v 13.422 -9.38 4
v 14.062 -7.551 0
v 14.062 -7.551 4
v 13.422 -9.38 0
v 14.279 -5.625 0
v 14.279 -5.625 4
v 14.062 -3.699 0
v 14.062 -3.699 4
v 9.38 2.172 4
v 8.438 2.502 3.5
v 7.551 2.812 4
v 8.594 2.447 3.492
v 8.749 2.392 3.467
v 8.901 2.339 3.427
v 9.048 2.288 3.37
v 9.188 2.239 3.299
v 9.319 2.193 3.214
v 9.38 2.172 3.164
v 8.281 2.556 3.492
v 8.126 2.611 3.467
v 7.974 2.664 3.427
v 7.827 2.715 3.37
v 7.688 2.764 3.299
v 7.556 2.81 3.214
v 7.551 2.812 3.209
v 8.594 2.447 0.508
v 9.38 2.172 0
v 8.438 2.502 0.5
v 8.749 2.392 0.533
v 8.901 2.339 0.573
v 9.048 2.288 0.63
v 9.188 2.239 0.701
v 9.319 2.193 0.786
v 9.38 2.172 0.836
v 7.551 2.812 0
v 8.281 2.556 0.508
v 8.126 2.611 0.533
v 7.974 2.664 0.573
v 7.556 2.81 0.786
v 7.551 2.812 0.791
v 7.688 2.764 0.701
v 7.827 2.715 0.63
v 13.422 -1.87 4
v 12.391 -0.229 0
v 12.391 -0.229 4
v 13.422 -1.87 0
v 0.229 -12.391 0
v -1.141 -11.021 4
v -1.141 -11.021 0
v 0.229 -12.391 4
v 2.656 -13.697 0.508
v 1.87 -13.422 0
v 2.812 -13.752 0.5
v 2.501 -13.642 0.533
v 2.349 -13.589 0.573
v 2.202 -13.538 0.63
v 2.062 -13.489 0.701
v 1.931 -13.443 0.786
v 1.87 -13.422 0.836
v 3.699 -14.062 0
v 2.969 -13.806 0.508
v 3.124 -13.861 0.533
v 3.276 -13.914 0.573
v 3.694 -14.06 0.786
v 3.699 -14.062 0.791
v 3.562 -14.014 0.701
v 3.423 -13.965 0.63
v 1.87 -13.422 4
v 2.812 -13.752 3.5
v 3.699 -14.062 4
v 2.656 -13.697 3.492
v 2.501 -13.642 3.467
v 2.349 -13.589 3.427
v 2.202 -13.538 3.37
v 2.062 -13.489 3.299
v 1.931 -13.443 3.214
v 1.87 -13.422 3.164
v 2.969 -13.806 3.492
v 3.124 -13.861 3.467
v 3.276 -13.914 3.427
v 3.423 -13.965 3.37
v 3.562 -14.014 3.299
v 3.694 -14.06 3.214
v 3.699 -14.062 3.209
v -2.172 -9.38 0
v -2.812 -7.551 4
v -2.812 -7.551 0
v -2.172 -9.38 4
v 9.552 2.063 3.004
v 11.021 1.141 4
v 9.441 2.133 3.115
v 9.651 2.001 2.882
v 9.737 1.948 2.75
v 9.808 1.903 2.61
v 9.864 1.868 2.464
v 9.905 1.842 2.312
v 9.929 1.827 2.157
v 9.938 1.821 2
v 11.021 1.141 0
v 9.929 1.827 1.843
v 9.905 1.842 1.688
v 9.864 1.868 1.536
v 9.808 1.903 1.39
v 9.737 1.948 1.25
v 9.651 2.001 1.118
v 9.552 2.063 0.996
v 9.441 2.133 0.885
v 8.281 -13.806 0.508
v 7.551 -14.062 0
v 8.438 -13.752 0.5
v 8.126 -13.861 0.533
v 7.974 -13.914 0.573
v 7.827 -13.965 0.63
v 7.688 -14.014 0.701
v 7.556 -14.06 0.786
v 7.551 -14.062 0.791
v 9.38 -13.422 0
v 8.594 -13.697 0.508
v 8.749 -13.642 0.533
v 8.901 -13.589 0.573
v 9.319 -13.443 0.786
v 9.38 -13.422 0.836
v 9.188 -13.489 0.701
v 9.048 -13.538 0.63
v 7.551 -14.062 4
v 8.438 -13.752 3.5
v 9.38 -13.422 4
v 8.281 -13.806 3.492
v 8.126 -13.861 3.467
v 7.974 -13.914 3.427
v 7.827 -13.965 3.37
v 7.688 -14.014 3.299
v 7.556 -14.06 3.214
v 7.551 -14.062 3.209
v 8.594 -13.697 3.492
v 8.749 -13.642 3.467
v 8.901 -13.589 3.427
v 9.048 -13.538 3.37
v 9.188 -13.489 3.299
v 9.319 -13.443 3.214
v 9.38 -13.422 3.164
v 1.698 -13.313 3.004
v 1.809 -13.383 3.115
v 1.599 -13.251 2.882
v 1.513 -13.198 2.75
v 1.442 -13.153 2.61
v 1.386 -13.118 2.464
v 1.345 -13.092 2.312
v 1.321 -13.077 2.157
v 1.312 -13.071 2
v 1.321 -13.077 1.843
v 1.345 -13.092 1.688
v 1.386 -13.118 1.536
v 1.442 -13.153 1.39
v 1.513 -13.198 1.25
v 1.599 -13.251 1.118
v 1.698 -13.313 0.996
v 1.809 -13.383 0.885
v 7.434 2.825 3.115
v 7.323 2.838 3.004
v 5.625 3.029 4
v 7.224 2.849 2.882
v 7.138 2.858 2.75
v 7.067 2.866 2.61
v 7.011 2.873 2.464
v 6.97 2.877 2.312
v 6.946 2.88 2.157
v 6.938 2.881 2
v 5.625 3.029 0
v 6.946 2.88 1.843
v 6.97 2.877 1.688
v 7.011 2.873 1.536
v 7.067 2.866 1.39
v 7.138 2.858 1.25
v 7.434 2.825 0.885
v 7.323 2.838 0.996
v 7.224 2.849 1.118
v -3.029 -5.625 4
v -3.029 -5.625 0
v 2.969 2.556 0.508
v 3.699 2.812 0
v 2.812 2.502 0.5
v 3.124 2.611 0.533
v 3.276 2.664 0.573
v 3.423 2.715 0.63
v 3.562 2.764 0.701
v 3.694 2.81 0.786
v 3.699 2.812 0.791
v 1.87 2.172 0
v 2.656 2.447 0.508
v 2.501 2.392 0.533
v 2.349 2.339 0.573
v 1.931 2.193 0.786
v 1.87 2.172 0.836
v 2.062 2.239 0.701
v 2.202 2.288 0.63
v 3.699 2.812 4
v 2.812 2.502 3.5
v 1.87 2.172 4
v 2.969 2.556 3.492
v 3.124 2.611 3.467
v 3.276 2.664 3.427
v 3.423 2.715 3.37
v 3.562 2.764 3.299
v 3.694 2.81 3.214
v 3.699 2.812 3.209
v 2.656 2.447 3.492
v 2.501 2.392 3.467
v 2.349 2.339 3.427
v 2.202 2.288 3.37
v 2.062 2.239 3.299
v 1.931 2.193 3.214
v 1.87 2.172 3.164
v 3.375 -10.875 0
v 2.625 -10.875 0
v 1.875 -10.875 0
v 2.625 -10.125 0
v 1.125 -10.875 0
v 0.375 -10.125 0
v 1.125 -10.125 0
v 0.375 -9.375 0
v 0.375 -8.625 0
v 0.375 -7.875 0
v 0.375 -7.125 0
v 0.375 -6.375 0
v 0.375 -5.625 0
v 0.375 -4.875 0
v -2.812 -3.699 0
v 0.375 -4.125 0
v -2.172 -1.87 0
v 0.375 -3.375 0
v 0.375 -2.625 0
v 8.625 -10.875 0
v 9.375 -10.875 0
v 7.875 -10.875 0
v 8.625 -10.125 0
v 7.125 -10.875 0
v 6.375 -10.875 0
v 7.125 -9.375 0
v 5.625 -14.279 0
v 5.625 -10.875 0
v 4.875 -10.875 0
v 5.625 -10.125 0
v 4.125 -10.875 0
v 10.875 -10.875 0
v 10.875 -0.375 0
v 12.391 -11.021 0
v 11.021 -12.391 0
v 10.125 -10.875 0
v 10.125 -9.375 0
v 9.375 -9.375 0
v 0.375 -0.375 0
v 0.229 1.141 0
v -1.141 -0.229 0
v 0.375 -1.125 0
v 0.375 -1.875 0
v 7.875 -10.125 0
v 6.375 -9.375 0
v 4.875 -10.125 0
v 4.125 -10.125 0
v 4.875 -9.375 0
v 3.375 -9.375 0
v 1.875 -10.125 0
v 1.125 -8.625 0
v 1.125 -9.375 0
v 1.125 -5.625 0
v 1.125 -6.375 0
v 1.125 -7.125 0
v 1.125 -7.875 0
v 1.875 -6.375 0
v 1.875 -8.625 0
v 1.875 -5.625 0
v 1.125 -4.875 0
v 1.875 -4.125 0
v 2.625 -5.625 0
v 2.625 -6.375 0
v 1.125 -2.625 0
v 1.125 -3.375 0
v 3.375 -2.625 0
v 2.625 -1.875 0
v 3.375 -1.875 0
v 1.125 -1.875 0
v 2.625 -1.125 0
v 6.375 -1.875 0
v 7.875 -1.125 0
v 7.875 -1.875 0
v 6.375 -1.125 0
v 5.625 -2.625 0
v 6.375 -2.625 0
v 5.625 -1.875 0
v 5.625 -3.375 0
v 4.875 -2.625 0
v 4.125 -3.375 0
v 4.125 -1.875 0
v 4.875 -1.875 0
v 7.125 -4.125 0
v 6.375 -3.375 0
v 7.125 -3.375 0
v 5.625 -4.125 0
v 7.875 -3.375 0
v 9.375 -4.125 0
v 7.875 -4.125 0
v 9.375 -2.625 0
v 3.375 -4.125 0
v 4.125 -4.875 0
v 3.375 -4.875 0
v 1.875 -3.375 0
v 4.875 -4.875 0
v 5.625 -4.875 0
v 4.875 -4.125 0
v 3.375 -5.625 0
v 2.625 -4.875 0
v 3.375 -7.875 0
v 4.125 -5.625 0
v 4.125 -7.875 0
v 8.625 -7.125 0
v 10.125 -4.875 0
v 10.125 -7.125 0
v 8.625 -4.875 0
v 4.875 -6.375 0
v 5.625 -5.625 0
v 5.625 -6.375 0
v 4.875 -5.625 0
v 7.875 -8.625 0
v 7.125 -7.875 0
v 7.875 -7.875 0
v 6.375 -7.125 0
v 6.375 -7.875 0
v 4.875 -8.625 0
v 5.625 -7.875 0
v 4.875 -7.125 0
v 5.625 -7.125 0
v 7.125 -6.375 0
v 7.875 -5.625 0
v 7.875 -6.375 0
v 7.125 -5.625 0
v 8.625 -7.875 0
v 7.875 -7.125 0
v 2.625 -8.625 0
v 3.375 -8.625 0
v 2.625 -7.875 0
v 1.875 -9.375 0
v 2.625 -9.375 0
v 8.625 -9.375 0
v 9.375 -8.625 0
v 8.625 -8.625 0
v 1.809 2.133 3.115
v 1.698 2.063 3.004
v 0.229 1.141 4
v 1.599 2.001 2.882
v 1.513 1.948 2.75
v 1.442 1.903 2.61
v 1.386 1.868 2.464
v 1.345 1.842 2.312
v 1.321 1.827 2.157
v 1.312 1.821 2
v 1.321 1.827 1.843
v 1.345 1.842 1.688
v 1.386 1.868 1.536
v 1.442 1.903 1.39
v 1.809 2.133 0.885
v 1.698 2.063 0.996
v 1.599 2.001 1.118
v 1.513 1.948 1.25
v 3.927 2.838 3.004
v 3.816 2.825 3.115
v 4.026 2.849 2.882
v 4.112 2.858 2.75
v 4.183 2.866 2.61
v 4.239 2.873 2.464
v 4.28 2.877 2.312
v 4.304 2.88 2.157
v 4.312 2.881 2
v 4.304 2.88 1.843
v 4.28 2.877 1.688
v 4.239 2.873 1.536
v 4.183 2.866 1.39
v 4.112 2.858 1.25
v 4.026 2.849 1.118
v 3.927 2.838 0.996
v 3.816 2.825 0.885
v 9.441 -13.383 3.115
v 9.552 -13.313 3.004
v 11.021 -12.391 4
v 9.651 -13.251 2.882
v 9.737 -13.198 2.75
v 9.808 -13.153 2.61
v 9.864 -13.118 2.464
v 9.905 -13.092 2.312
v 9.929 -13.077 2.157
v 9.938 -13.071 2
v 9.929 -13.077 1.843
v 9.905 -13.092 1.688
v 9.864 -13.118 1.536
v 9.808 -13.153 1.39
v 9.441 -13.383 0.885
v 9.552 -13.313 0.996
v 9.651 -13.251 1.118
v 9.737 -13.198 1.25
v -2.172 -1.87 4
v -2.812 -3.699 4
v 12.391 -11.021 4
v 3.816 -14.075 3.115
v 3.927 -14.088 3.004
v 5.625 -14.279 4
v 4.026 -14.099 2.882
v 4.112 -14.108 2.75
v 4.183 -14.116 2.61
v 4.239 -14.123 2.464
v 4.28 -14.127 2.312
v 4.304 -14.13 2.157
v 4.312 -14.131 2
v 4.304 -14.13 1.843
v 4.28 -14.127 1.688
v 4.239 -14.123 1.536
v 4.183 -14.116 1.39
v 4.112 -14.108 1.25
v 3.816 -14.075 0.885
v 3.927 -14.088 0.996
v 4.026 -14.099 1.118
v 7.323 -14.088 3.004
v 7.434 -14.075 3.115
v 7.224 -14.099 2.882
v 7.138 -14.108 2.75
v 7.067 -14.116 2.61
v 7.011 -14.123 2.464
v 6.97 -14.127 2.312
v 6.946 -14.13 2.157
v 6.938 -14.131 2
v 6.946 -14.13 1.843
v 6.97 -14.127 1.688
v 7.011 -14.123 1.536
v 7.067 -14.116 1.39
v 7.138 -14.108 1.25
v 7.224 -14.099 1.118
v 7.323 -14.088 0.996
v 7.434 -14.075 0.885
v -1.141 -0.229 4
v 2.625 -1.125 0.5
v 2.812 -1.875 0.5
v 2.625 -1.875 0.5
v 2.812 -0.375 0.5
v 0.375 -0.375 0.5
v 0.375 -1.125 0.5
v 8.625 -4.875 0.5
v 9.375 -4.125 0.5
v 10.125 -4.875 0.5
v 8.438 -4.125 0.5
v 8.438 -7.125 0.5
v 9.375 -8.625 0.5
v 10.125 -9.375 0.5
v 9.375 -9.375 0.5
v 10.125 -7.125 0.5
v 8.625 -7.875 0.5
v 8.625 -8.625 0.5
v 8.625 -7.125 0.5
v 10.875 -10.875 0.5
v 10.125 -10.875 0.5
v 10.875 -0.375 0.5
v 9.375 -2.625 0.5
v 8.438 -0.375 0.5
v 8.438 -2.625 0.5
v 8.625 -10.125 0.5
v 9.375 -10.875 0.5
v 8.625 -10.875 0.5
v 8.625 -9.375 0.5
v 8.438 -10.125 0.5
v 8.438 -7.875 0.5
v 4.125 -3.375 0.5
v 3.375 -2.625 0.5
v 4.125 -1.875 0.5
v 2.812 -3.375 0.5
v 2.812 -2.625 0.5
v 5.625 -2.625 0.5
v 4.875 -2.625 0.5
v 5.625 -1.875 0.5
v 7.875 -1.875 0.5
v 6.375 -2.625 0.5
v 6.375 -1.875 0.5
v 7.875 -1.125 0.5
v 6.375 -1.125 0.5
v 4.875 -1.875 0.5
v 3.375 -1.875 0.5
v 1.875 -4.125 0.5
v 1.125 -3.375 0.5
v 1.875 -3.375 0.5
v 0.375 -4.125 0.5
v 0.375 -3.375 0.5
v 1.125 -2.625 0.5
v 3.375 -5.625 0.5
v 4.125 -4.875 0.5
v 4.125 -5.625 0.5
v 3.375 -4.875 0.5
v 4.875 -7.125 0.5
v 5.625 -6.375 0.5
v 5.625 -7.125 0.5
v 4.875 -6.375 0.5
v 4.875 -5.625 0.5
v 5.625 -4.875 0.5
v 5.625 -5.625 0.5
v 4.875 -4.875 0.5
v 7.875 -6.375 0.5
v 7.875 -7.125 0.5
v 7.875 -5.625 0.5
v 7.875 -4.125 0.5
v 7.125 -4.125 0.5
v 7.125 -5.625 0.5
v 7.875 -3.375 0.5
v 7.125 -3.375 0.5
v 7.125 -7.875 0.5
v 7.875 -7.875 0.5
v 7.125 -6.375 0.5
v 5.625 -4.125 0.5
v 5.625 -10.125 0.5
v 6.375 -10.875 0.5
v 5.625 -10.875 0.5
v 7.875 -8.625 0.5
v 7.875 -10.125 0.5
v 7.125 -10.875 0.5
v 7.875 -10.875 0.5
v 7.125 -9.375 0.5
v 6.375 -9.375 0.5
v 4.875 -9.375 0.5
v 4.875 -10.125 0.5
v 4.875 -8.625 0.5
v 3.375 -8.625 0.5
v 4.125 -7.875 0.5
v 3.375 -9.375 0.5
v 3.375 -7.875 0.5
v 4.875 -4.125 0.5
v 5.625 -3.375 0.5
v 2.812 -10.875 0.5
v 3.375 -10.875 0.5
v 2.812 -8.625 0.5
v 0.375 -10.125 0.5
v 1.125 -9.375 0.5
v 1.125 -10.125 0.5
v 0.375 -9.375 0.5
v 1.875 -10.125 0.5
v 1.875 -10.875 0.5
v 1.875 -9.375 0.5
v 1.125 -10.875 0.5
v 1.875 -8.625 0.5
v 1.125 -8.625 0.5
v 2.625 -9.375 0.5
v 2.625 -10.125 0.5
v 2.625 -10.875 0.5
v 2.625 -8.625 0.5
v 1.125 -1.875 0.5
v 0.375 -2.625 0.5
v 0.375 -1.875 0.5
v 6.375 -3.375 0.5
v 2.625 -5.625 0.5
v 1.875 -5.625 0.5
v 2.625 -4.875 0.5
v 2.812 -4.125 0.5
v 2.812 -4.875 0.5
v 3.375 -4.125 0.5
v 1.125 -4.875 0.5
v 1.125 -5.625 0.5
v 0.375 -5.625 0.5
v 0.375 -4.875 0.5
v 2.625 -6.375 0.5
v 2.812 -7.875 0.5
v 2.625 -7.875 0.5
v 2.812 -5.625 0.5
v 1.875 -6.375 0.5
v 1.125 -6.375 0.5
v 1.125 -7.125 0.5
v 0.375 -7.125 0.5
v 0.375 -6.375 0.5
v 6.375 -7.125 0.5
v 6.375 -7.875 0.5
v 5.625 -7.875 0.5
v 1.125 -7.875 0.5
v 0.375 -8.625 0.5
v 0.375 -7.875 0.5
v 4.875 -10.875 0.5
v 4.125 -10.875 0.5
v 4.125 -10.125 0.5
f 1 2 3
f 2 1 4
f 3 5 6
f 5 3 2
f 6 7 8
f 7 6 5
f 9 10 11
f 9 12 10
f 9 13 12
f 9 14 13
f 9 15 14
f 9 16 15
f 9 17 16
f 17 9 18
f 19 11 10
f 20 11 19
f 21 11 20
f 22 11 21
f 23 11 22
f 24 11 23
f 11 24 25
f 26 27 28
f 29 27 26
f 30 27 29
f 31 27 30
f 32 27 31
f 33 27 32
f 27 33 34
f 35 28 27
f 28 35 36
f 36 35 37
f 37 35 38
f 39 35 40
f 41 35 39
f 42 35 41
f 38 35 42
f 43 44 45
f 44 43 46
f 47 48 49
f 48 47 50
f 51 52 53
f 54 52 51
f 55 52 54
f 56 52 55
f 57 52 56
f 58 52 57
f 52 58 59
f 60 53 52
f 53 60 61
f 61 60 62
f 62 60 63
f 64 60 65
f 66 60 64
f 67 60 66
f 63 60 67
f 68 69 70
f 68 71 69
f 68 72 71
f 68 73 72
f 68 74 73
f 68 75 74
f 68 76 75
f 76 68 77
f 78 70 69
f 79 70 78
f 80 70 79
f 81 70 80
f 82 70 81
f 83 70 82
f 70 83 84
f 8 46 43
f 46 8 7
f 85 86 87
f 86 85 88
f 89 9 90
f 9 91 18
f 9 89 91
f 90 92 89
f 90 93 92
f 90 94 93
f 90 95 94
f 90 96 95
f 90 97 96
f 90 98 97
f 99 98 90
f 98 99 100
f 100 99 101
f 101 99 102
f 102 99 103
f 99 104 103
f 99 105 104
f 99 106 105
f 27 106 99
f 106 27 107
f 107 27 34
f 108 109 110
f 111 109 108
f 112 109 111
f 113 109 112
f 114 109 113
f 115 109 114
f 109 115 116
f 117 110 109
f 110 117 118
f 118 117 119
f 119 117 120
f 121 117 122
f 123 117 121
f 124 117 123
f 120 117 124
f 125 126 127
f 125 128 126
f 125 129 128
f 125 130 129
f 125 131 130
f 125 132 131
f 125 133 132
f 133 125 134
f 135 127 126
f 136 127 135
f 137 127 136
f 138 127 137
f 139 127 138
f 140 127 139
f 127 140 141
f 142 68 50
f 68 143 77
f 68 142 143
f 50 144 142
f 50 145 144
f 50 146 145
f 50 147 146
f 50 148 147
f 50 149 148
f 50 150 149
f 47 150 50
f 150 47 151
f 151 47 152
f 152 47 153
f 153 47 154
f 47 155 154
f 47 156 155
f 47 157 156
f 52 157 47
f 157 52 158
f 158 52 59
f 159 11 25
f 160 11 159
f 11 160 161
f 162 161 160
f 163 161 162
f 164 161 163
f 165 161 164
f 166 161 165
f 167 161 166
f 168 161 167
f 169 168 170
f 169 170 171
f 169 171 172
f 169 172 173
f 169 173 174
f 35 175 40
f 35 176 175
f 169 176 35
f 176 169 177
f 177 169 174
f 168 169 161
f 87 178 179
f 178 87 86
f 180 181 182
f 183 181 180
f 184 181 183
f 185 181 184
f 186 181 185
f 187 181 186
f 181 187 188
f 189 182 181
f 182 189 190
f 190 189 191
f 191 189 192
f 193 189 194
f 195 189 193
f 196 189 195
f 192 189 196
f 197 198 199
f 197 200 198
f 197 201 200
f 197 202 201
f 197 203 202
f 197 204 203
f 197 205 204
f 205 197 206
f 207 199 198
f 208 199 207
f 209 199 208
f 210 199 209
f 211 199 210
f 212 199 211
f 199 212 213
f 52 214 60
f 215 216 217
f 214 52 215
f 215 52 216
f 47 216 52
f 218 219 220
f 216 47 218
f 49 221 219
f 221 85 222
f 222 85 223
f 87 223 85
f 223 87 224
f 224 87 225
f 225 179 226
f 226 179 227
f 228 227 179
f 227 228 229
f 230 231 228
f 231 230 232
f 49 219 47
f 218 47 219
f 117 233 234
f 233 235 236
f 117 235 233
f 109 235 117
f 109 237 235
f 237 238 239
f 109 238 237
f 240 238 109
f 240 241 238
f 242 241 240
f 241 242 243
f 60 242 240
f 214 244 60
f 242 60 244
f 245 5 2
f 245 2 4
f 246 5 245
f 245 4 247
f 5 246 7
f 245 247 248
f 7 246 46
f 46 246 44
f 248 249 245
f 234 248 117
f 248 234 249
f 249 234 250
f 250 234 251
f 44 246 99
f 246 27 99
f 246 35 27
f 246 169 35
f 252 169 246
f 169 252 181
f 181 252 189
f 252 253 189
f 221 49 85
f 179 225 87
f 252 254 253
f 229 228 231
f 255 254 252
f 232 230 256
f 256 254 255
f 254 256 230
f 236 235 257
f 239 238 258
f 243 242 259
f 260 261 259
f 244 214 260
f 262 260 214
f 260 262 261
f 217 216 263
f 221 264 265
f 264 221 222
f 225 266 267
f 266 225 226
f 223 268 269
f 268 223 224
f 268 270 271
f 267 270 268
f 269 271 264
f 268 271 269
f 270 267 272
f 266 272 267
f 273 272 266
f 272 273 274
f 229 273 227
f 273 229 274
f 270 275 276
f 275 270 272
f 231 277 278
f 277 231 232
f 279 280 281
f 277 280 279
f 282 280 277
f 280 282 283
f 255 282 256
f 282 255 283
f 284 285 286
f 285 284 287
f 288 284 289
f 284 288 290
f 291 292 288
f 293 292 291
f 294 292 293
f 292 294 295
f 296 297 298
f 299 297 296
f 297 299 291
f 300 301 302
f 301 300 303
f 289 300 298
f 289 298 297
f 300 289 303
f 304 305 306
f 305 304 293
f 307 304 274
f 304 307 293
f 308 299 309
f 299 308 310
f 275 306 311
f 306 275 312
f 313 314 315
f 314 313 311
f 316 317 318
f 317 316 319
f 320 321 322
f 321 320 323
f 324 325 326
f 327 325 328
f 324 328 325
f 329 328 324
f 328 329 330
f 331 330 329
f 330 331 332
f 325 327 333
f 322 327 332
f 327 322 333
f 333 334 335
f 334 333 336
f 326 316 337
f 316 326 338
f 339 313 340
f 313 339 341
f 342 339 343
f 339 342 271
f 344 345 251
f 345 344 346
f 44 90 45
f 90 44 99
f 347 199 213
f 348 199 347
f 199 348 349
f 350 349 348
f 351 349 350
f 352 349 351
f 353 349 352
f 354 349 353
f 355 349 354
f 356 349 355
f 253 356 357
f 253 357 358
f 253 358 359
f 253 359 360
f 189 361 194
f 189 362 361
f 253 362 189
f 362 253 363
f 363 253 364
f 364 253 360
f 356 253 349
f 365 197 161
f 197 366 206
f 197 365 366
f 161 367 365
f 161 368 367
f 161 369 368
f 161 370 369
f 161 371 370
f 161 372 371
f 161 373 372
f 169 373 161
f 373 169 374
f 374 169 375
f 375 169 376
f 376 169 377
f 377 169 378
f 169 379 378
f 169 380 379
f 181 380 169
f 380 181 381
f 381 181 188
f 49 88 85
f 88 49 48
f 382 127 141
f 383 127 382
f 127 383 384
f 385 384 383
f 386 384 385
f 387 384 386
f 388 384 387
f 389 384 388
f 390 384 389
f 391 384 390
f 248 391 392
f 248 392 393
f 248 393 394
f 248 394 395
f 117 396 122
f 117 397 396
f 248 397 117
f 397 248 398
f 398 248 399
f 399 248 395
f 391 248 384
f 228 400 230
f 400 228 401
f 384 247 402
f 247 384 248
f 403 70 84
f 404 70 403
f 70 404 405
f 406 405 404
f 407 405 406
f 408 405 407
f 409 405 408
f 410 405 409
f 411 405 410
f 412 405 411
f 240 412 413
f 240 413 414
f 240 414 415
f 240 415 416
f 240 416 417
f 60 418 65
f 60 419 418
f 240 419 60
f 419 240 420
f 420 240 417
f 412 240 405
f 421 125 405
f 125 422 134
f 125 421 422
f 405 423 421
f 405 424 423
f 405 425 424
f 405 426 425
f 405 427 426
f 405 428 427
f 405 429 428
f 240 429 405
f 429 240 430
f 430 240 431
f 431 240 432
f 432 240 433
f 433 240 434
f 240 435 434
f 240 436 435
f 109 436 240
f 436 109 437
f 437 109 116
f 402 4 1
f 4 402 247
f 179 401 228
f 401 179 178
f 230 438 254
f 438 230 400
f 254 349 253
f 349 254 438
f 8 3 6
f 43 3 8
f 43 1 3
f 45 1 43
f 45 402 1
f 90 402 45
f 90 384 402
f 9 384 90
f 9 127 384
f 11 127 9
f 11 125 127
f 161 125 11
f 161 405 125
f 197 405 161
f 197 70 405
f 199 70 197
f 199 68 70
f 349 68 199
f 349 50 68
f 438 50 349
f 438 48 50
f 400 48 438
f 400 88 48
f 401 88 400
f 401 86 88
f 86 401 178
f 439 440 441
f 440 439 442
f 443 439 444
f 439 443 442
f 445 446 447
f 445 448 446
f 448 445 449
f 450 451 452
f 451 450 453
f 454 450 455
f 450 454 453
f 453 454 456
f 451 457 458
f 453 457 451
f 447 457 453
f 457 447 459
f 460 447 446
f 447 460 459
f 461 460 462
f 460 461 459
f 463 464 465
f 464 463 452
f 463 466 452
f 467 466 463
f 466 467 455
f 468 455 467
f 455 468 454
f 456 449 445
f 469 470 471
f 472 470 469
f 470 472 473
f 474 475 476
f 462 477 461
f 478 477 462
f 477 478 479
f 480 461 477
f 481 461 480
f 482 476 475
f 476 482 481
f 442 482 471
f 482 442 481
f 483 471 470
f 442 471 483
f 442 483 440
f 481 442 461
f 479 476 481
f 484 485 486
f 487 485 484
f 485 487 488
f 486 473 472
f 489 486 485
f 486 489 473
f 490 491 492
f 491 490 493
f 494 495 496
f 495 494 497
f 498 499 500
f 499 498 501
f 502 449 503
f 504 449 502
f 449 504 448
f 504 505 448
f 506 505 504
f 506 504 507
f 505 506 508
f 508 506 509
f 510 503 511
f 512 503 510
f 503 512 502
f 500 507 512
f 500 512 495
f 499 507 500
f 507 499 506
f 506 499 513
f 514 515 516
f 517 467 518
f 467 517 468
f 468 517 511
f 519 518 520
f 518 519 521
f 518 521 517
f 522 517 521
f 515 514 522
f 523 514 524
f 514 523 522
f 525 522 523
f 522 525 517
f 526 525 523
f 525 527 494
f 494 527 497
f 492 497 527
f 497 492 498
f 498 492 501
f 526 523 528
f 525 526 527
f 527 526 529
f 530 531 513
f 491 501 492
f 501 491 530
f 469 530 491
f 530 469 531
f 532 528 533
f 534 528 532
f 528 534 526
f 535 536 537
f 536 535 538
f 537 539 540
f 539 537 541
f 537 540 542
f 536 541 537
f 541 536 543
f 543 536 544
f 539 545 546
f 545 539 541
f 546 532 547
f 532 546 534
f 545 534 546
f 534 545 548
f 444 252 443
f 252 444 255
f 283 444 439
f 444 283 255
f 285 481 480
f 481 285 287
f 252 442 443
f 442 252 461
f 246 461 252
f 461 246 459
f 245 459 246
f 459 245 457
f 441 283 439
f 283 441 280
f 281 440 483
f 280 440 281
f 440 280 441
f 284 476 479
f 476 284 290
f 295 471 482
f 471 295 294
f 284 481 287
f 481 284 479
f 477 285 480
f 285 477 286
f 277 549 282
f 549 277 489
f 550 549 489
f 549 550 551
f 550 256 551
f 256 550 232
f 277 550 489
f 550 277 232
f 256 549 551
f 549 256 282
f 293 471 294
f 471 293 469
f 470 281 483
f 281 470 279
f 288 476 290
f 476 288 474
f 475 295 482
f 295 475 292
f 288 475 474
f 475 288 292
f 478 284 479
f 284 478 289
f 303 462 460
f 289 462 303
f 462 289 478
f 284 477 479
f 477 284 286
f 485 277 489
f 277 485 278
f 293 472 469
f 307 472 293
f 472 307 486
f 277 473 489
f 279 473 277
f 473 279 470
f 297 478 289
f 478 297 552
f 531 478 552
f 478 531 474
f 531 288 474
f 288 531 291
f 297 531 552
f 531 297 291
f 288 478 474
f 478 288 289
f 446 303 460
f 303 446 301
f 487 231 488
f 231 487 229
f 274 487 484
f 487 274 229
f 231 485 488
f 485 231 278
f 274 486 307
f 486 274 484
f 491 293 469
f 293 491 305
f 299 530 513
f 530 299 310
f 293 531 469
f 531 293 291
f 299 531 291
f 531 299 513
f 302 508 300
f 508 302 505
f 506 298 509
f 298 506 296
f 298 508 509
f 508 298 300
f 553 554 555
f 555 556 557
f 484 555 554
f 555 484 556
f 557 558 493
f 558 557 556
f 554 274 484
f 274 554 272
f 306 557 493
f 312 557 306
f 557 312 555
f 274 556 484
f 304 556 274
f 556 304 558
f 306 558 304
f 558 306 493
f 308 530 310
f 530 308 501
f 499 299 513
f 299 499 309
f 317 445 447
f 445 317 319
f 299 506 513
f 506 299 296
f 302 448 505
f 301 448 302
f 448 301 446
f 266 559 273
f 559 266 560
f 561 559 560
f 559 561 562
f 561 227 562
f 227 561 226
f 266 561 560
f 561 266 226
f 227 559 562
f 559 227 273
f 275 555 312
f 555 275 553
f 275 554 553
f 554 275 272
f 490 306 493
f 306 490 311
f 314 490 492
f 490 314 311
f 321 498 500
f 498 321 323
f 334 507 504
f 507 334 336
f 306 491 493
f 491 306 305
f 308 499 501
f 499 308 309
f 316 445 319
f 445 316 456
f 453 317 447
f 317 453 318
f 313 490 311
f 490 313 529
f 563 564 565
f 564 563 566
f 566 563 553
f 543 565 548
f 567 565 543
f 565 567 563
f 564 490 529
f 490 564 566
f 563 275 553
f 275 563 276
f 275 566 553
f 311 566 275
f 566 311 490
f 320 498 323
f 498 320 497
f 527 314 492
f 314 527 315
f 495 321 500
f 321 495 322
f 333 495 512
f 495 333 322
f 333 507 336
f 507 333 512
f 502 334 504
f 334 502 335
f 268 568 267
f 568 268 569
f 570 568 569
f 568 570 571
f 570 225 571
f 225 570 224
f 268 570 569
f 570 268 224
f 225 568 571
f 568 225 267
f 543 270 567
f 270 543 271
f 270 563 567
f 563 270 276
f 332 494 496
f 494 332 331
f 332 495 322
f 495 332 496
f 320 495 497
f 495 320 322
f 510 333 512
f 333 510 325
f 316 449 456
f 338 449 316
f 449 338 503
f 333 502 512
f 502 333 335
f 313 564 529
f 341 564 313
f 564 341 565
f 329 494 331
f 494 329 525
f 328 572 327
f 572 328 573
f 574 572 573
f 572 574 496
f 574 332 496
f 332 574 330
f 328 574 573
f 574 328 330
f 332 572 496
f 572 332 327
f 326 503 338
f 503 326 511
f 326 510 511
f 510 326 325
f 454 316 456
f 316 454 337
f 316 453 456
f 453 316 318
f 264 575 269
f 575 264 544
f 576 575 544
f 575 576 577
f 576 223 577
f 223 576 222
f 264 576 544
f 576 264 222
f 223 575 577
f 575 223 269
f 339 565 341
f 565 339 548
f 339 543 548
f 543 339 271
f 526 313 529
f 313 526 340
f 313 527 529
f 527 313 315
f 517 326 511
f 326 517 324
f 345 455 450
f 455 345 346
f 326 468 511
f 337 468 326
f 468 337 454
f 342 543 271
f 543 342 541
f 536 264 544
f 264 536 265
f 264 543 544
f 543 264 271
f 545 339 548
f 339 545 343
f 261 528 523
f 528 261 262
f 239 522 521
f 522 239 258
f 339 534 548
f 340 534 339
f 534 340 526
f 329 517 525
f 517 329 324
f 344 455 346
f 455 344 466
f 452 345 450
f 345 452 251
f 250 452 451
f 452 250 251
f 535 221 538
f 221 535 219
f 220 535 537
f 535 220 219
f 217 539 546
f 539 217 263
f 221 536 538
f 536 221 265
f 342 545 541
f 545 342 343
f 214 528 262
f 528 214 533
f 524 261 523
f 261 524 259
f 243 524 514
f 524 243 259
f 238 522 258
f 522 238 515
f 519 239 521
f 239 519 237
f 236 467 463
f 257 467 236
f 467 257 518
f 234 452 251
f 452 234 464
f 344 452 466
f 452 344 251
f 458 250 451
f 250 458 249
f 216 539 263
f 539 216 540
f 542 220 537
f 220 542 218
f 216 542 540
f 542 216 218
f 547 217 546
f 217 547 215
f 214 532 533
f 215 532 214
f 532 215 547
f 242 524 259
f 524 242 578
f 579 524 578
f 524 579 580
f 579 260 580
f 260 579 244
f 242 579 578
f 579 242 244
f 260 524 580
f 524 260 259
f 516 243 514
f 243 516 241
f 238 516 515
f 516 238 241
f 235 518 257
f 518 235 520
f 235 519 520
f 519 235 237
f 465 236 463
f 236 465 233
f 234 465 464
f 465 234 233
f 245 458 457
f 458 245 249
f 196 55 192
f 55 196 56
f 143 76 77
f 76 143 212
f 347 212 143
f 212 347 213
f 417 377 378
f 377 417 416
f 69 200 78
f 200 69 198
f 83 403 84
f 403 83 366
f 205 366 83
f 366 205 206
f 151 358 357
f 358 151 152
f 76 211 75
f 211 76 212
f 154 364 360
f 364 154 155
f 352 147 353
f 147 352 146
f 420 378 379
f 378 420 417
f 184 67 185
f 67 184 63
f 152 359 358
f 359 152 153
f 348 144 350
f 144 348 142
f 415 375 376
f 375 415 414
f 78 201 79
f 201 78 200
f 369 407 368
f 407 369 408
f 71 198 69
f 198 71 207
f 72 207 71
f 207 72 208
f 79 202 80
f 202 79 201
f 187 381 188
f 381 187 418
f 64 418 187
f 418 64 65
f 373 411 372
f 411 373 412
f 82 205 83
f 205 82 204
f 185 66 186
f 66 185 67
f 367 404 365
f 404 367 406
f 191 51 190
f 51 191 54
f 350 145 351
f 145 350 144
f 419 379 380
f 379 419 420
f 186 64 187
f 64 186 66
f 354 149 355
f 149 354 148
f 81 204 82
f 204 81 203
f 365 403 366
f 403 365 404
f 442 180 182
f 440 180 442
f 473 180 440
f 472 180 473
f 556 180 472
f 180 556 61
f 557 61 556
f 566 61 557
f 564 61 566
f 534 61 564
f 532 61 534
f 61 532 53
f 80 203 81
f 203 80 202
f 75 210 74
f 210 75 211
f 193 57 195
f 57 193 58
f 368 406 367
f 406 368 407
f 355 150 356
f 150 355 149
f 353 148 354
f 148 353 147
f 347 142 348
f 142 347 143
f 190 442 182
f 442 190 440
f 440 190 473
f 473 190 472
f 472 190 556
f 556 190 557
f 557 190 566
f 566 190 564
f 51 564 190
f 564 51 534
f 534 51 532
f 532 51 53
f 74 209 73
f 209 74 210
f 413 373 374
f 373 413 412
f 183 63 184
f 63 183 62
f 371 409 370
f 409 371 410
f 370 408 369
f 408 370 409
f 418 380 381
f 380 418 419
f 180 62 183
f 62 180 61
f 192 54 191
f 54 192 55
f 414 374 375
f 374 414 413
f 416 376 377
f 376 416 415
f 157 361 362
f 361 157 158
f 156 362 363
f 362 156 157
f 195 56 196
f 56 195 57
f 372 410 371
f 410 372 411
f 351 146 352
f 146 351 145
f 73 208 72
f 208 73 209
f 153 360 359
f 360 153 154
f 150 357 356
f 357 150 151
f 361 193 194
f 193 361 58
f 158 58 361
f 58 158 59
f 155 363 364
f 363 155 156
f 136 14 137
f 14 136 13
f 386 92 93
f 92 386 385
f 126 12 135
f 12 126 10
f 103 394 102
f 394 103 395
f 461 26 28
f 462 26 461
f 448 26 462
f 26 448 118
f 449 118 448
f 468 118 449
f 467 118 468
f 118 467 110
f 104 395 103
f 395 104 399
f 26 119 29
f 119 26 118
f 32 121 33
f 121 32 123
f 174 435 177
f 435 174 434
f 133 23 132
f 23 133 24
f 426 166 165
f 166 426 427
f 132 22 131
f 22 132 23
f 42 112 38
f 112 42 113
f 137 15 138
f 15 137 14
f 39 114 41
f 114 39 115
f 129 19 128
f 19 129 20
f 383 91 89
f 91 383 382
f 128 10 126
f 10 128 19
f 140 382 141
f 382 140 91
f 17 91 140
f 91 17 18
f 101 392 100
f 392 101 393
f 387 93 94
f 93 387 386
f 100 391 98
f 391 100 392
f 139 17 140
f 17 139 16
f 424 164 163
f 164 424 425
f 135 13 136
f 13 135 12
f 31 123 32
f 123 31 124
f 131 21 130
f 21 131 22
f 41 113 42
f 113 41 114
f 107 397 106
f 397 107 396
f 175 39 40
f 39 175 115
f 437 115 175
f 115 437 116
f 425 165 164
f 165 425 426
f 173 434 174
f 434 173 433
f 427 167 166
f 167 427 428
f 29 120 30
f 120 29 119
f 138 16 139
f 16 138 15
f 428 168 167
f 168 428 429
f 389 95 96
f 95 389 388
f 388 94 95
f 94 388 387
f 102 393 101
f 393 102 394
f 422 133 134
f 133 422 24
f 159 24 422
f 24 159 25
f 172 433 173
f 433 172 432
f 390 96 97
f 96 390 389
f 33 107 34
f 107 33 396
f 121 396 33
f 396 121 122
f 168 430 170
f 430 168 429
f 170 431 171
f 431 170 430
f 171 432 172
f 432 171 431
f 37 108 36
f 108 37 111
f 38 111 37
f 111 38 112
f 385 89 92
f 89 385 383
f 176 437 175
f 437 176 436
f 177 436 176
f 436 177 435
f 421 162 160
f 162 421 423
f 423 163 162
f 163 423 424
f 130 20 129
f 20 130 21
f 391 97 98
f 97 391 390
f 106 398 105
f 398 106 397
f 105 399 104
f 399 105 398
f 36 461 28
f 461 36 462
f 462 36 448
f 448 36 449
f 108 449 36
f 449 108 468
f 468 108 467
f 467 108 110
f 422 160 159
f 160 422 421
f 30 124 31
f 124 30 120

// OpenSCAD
rotate([180,0,0])difference(){translate([5.625,5.625,-2])  cylinder(r=8.65384615384615,h=4, center=true);
translate([0.75,0.75,0])  cube(size = [0.75,0.75,1], center=true);
translate([1.5,0.75,0])  cube(size = [0.75,0.75,1], center=true);
translate([2.25,0.75,0])  cube(size = [0.75,0.75,1], center=true);
translate([3,0.75,0])  cube(size = [0.75,0.75,1], center=true);
translate([3.75,0.75,0])  cube(size = [0.75,0.75,1], center=true);
translate([4.5,0.75,0])  cube(size = [0.75,0.75,1], center=true);
translate([5.25,0.75,0])  cube(size = [0.75,0.75,1], center=true);
translate([6,0.75,0])  cube(size = [0.75,0.75,1], center=true);
translate([6.75,0.75,0])  cube(size = [0.75,0.75,1], center=true);
translate([7.5,0.75,0])  cube(size = [0.75,0.75,1], center=true);
translate([8.25,0.75,0])  cube(size = [0.75,0.75,1], center=true);
translate([9,0.75,0])  cube(size = [0.75,0.75,1], center=true);
translate([9.75,0.75,0])  cube(size = [0.75,0.75,1], center=true);
translate([10.5,0.75,0])  cube(size = [0.75,0.75,1], center=true);
translate([10.5,0.75,0])  cube(size = [0.75,0.75,1], center=true);
translate([10.5,0.75,0])  cube(size = [0.75,0.75,1], center=true);
translate([10.5,0.75,0])  cube(size = [0.75,0.75,1], center=true);
translate([3,1.5,0])  cube(size = [0.75,0.75,1], center=true);
translate([3.75,1.5,0])  cube(size = [0.75,0.75,1], center=true);
translate([4.5,1.5,0])  cube(size = [0.75,0.75,1], center=true);
translate([5.25,1.5,0])  cube(size = [0.75,0.75,1], center=true);
translate([6,1.5,0])  cube(size = [0.75,0.75,1], center=true);
translate([6,1.5,0])  cube(size = [0.75,0.75,1], center=true);
translate([6,1.5,0])  cube(size = [0.75,0.75,1], center=true);
translate([8.25,1.5,0])  cube(size = [0.75,0.75,1], center=true);
translate([9,1.5,0])  cube(size = [0.75,0.75,1], center=true);
translate([9.75,1.5,0])  cube(size = [0.75,0.75,1], center=true);
translate([10.5,1.5,0])  cube(size = [0.75,0.75,1], center=true);
translate([0.75,2.25,0])  cube(size = [0.75,0.75,1], center=true);
translate([0.75,2.25,0])  cube(size = [0.75,0.75,1], center=true);
translate([0.75,2.25,0])  cube(size = [0.75,0.75,1], center=true);
translate([0.75,2.25,0])  cube(size = [0.75,0.75,1], center=true);
translate([3.75,2.25,0])  cube(size = [0.75,0.75,1], center=true);
translate([3.75,2.25,0])  cube(size = [0.75,0.75,1], center=true);
translate([5.25,2.25,0])  cube(size = [0.75,0.75,1], center=true);
translate([5.25,2.25,0])  cube(size = [0.75,0.75,1], center=true);
translate([6.75,2.25,0])  cube(size = [0.75,0.75,1], center=true);
translate([7.5,2.25,0])  cube(size = [0.75,0.75,1], center=true);
translate([8.25,2.25,0])  cube(size = [0.75,0.75,1], center=true);
translate([9,2.25,0])  cube(size = [0.75,0.75,1], center=true);
translate([9.75,2.25,0])  cube(size = [0.75,0.75,1], center=true);
translate([10.5,2.25,0])  cube(size = [0.75,0.75,1], center=true);
translate([10.5,2.25,0])  cube(size = [0.75,0.75,1], center=true);
translate([1.5,3,0])  cube(size = [0.75,0.75,1], center=true);
translate([2.25,3,0])  cube(size = [0.75,0.75,1], center=true);
translate([3,3,0])  cube(size = [0.75,0.75,1], center=true);
translate([3.75,3,0])  cube(size = [0.75,0.75,1], center=true);
translate([3.75,3,0])  cube(size = [0.75,0.75,1], center=true);
translate([3.75,3,0])  cube(size = [0.75,0.75,1], center=true);
translate([6,3,0])  cube(size = [0.75,0.75,1], center=true);
translate([6,3,0])  cube(size = [0.75,0.75,1], center=true);
translate([6,3,0])  cube(size = [0.75,0.75,1], center=true);
translate([6,3,0])  cube(size = [0.75,0.75,1], center=true);
translate([6,3,0])  cube(size = [0.75,0.75,1], center=true);
translate([9.75,3,0])  cube(size = [0.75,0.75,1], center=true);
translate([10.5,3,0])  cube(size = [0.75,0.75,1], center=true);
translate([0.75,3.75,0])  cube(size = [0.75,0.75,1], center=true);
translate([1.5,3.75,0])  cube(size = [0.75,0.75,1], center=true);
translate([1.5,3.75,0])  cube(size = [0.75,0.75,1], center=true);
translate([1.5,3.75,0])  cube(size = [0.75,0.75,1], center=true);
translate([1.5,3.75,0])  cube(size = [0.75,0.75,1], center=true);
translate([4.5,3.75,0])  cube(size = [0.75,0.75,1], center=true);
translate([5.25,3.75,0])  cube(size = [0.75,0.75,1], center=true);
translate([5.25,3.75,0])  cube(size = [0.75,0.75,1], center=true);
translate([5.25,3.75,0])  cube(size = [0.75,0.75,1], center=true);
translate([7.5,3.75,0])  cube(size = [0.75,0.75,1], center=true);
translate([7.5,3.75,0])  cube(size = [0.75,0.75,1], center=true);
translate([7.5,3.75,0])  cube(size = [0.75,0.75,1], center=true);
translate([9.75,3.75,0])  cube(size = [0.75,0.75,1], center=true);
translate([10.5,3.75,0])  cube(size = [0.75,0.75,1], center=true);
translate([10.5,3.75,0])  cube(size = [0.75,0.75,1], center=true);
translate([10.5,3.75,0])  cube(size = [0.75,0.75,1], center=true);
translate([2.25,4.5,0])  cube(size = [0.75,0.75,1], center=true);
translate([3,4.5,0])  cube(size = [0.75,0.75,1], center=true);
translate([3,4.5,0])  cube(size = [0.75,0.75,1], center=true);
translate([4.5,4.5,0])  cube(size = [0.75,0.75,1], center=true);
translate([4.5,4.5,0])  cube(size = [0.75,0.75,1], center=true);
translate([6,4.5,0])  cube(size = [0.75,0.75,1], center=true);
translate([6.75,4.5,0])  cube(size = [0.75,0.75,1], center=true);
translate([7.5,4.5,0])  cube(size = [0.75,0.75,1], center=true);
translate([8.25,4.5,0])  cube(size = [0.75,0.75,1], center=true);
translate([9,4.5,0])  cube(size = [0.75,0.75,1], center=true);
translate([9.75,4.5,0])  cube(size = [0.75,0.75,1], center=true);
translate([10.5,4.5,0])  cube(size = [0.75,0.75,1], center=true);
translate([0.75,5.25,0])  cube(size = [0.75,0.75,1], center=true);
translate([0.75,5.25,0])  cube(size = [0.75,0.75,1], center=true);
translate([2.25,5.25,0])  cube(size = [0.75,0.75,1], center=true);
translate([2.25,5.25,0])  cube(size = [0.75,0.75,1], center=true);
translate([3.75,5.25,0])  cube(size = [0.75,0.75,1], center=true);
translate([4.5,5.25,0])  cube(size = [0.75,0.75,1], center=true);
translate([5.25,5.25,0])  cube(size = [0.75,0.75,1], center=true);
translate([6,5.25,0])  cube(size = [0.75,0.75,1], center=true);
translate([6.75,5.25,0])  cube(size = [0.75,0.75,1], center=true);
translate([7.5,5.25,0])  cube(size = [0.75,0.75,1], center=true);
translate([8.25,5.25,0])  cube(size = [0.75,0.75,1], center=true);
translate([8.25,5.25,0])  cube(size = [0.75,0.75,1], center=true);
translate([8.25,5.25,0])  cube(size = [0.75,0.75,1], center=true);
translate([10.5,5.25,0])  cube(size = [0.75,0.75,1], center=true);
translate([10.5,5.25,0])  cube(size = [0.75,0.75,1], center=true);
translate([10.5,5.25,0])  cube(size = [0.75,0.75,1], center=true);
translate([10.5,5.25,0])  cube(size = [0.75,0.75,1], center=true);
translate([3,6,0])  cube(size = [0.75,0.75,1], center=true);
translate([3,6,0])  cube(size = [0.75,0.75,1], center=true);
translate([4.5,6,0])  cube(size = [0.75,0.75,1], center=true);
translate([4.5,6,0])  cube(size = [0.75,0.75,1], center=true);
translate([6,6,0])  cube(size = [0.75,0.75,1], center=true);
translate([6.75,6,0])  cube(size = [0.75,0.75,1], center=true);
translate([6.75,6,0])  cube(size = [0.75,0.75,1], center=true);
translate([8.25,6,0])  cube(size = [0.75,0.75,1], center=true);
translate([8.25,6,0])  cube(size = [0.75,0.75,1], center=true);
translate([8.25,6,0])  cube(size = [0.75,0.75,1], center=true);
translate([10.5,6,0])  cube(size = [0.75,0.75,1], center=true);
translate([0.75,6.75,0])  cube(size = [0.75,0.75,1], center=true);
translate([0.75,6.75,0])  cube(size = [0.75,0.75,1], center=true);
translate([2.25,6.75,0])  cube(size = [0.75,0.75,1], center=true);
translate([3,6.75,0])  cube(size = [0.75,0.75,1], center=true);
translate([3,6.75,0])  cube(size = [0.75,0.75,1], center=true);
translate([4.5,6.75,0])  cube(size = [0.75,0.75,1], center=true);
translate([5.25,6.75,0])  cube(size = [0.75,0.75,1], center=true);
translate([5.25,6.75,0])  cube(size = [0.75,0.75,1], center=true);
translate([5.25,6.75,0])  cube(size = [0.75,0.75,1], center=true);
translate([7.5,6.75,0])  cube(size = [0.75,0.75,1], center=true);
translate([8.25,6.75,0])  cube(size = [0.75,0.75,1], center=true);
translate([8.25,6.75,0])  cube(size = [0.75,0.75,1], center=true);
translate([8.25,6.75,0])  cube(size = [0.75,0.75,1], center=true);
translate([10.5,6.75,0])  cube(size = [0.75,0.75,1], center=true);
translate([10.5,6.75,0])  cube(size = [0.75,0.75,1], center=true);
translate([10.5,6.75,0])  cube(size = [0.75,0.75,1], center=true);
translate([2.25,7.5,0])  cube(size = [0.75,0.75,1], center=true);
translate([3,7.5,0])  cube(size = [0.75,0.75,1], center=true);
translate([3,7.5,0])  cube(size = [0.75,0.75,1], center=true);
translate([4.5,7.5,0])  cube(size = [0.75,0.75,1], center=true);
translate([4.5,7.5,0])  cube(size = [0.75,0.75,1], center=true);
translate([6,7.5,0])  cube(size = [0.75,0.75,1], center=true);
translate([6,7.5,0])  cube(size = [0.75,0.75,1], center=true);
translate([7.5,7.5,0])  cube(size = [0.75,0.75,1], center=true);
translate([7.5,7.5,0])  cube(size = [0.75,0.75,1], center=true);
translate([9,7.5,0])  cube(size = [0.75,0.75,1], center=true);
translate([9.75,7.5,0])  cube(size = [0.75,0.75,1], center=true);
translate([10.5,7.5,0])  cube(size = [0.75,0.75,1], center=true);
translate([0.75,8.25,0])  cube(size = [0.75,0.75,1], center=true);
translate([0.75,8.25,0])  cube(size = [0.75,0.75,1], center=true);
translate([2.25,8.25,0])  cube(size = [0.75,0.75,1], center=true);
translate([2.25,8.25,0])  cube(size = [0.75,0.75,1], center=true);
translate([3.75,8.25,0])  cube(size = [0.75,0.75,1], center=true);
translate([4.5,8.25,0])  cube(size = [0.75,0.75,1], center=true);
translate([4.5,8.25,0])  cube(size = [0.75,0.75,1], center=true);
translate([4.5,8.25,0])  cube(size = [0.75,0.75,1], center=true);
translate([4.5,8.25,0])  cube(size = [0.75,0.75,1], center=true);
translate([4.5,8.25,0])  cube(size = [0.75,0.75,1], center=true);
translate([8.25,8.25,0])  cube(size = [0.75,0.75,1], center=true);
translate([9,8.25,0])  cube(size = [0.75,0.75,1], center=true);
translate([9.75,8.25,0])  cube(size = [0.75,0.75,1], center=true);
translate([10.5,8.25,0])  cube(size = [0.75,0.75,1], center=true);
translate([10.5,8.25,0])  cube(size = [0.75,0.75,1], center=true);
translate([1.5,9,0])  cube(size = [0.75,0.75,1], center=true);
translate([1.5,9,0])  cube(size = [0.75,0.75,1], center=true);
translate([3,9,0])  cube(size = [0.75,0.75,1], center=true);
translate([3.75,9,0])  cube(size = [0.75,0.75,1], center=true);
translate([4.5,9,0])  cube(size = [0.75,0.75,1], center=true);
translate([5.25,9,0])  cube(size = [0.75,0.75,1], center=true);
translate([6,9,0])  cube(size = [0.75,0.75,1], center=true);
translate([6.75,9,0])  cube(size = [0.75,0.75,1], center=true);
translate([7.5,9,0])  cube(size = [0.75,0.75,1], center=true);
translate([8.25,9,0])  cube(size = [0.75,0.75,1], center=true);
translate([8.25,9,0])  cube(size = [0.75,0.75,1], center=true);
translate([9.75,9,0])  cube(size = [0.75,0.75,1], center=true);
translate([10.5,9,0])  cube(size = [0.75,0.75,1], center=true);
translate([0.75,9.75,0])  cube(size = [0.75,0.75,1], center=true);
translate([1.5,9.75,0])  cube(size = [0.75,0.75,1], center=true);
translate([2.25,9.75,0])  cube(size = [0.75,0.75,1], center=true);
translate([3,9.75,0])  cube(size = [0.75,0.75,1], center=true);
translate([3,9.75,0])  cube(size = [0.75,0.75,1], center=true);
translate([3,9.75,0])  cube(size = [0.75,0.75,1], center=true);
translate([5.25,9.75,0])  cube(size = [0.75,0.75,1], center=true);
translate([6,9.75,0])  cube(size = [0.75,0.75,1], center=true);
translate([6,9.75,0])  cube(size = [0.75,0.75,1], center=true);
translate([7.5,9.75,0])  cube(size = [0.75,0.75,1], center=true);
translate([8.25,9.75,0])  cube(size = [0.75,0.75,1], center=true);
translate([9,9.75,0])  cube(size = [0.75,0.75,1], center=true);
translate([9,9.75,0])  cube(size = [0.75,0.75,1], center=true);
translate([10.5,9.75,0])  cube(size = [0.75,0.75,1], center=true);
translate([10.5,9.75,0])  cube(size = [0.75,0.75,1], center=true);
translate([1.5,10.5,0])  cube(size = [0.75,0.75,1], center=true);
translate([1.5,10.5,0])  cube(size = [0.75,0.75,1], center=true);
translate([3,10.5,0])  cube(size = [0.75,0.75,1], center=true);
translate([3,10.5,0])  cube(size = [0.75,0.75,1], center=true);
translate([4.5,10.5,0])  cube(size = [0.75,0.75,1], center=true);
translate([4.5,10.5,0])  cube(size = [0.75,0.75,1], center=true);
translate([6,10.5,0])  cube(size = [0.75,0.75,1], center=true);
translate([6,10.5,0])  cube(size = [0.75,0.75,1], center=true);
translate([7.5,10.5,0])  cube(size = [0.75,0.75,1], center=true);
translate([7.5,10.5,0])  cube(size = [0.75,0.75,1], center=true);
translate([9,10.5,0])  cube(size = [0.75,0.75,1], center=true);
translate([9,10.5,0])  cube(size = [0.75,0.75,1], center=true);
translate([10.5,10.5,0])  cube(size = [0.75,0.75,1], center=true);
rotate([90,90,0])translate([2,2.8125,0])  cylinder(r=1.5,h=400, $fn=60, center=true);
rotate([90,90,0])translate([2,8.4375,0])  cylinder(r=1.5,h=400, $fn=60, center=true);
}
